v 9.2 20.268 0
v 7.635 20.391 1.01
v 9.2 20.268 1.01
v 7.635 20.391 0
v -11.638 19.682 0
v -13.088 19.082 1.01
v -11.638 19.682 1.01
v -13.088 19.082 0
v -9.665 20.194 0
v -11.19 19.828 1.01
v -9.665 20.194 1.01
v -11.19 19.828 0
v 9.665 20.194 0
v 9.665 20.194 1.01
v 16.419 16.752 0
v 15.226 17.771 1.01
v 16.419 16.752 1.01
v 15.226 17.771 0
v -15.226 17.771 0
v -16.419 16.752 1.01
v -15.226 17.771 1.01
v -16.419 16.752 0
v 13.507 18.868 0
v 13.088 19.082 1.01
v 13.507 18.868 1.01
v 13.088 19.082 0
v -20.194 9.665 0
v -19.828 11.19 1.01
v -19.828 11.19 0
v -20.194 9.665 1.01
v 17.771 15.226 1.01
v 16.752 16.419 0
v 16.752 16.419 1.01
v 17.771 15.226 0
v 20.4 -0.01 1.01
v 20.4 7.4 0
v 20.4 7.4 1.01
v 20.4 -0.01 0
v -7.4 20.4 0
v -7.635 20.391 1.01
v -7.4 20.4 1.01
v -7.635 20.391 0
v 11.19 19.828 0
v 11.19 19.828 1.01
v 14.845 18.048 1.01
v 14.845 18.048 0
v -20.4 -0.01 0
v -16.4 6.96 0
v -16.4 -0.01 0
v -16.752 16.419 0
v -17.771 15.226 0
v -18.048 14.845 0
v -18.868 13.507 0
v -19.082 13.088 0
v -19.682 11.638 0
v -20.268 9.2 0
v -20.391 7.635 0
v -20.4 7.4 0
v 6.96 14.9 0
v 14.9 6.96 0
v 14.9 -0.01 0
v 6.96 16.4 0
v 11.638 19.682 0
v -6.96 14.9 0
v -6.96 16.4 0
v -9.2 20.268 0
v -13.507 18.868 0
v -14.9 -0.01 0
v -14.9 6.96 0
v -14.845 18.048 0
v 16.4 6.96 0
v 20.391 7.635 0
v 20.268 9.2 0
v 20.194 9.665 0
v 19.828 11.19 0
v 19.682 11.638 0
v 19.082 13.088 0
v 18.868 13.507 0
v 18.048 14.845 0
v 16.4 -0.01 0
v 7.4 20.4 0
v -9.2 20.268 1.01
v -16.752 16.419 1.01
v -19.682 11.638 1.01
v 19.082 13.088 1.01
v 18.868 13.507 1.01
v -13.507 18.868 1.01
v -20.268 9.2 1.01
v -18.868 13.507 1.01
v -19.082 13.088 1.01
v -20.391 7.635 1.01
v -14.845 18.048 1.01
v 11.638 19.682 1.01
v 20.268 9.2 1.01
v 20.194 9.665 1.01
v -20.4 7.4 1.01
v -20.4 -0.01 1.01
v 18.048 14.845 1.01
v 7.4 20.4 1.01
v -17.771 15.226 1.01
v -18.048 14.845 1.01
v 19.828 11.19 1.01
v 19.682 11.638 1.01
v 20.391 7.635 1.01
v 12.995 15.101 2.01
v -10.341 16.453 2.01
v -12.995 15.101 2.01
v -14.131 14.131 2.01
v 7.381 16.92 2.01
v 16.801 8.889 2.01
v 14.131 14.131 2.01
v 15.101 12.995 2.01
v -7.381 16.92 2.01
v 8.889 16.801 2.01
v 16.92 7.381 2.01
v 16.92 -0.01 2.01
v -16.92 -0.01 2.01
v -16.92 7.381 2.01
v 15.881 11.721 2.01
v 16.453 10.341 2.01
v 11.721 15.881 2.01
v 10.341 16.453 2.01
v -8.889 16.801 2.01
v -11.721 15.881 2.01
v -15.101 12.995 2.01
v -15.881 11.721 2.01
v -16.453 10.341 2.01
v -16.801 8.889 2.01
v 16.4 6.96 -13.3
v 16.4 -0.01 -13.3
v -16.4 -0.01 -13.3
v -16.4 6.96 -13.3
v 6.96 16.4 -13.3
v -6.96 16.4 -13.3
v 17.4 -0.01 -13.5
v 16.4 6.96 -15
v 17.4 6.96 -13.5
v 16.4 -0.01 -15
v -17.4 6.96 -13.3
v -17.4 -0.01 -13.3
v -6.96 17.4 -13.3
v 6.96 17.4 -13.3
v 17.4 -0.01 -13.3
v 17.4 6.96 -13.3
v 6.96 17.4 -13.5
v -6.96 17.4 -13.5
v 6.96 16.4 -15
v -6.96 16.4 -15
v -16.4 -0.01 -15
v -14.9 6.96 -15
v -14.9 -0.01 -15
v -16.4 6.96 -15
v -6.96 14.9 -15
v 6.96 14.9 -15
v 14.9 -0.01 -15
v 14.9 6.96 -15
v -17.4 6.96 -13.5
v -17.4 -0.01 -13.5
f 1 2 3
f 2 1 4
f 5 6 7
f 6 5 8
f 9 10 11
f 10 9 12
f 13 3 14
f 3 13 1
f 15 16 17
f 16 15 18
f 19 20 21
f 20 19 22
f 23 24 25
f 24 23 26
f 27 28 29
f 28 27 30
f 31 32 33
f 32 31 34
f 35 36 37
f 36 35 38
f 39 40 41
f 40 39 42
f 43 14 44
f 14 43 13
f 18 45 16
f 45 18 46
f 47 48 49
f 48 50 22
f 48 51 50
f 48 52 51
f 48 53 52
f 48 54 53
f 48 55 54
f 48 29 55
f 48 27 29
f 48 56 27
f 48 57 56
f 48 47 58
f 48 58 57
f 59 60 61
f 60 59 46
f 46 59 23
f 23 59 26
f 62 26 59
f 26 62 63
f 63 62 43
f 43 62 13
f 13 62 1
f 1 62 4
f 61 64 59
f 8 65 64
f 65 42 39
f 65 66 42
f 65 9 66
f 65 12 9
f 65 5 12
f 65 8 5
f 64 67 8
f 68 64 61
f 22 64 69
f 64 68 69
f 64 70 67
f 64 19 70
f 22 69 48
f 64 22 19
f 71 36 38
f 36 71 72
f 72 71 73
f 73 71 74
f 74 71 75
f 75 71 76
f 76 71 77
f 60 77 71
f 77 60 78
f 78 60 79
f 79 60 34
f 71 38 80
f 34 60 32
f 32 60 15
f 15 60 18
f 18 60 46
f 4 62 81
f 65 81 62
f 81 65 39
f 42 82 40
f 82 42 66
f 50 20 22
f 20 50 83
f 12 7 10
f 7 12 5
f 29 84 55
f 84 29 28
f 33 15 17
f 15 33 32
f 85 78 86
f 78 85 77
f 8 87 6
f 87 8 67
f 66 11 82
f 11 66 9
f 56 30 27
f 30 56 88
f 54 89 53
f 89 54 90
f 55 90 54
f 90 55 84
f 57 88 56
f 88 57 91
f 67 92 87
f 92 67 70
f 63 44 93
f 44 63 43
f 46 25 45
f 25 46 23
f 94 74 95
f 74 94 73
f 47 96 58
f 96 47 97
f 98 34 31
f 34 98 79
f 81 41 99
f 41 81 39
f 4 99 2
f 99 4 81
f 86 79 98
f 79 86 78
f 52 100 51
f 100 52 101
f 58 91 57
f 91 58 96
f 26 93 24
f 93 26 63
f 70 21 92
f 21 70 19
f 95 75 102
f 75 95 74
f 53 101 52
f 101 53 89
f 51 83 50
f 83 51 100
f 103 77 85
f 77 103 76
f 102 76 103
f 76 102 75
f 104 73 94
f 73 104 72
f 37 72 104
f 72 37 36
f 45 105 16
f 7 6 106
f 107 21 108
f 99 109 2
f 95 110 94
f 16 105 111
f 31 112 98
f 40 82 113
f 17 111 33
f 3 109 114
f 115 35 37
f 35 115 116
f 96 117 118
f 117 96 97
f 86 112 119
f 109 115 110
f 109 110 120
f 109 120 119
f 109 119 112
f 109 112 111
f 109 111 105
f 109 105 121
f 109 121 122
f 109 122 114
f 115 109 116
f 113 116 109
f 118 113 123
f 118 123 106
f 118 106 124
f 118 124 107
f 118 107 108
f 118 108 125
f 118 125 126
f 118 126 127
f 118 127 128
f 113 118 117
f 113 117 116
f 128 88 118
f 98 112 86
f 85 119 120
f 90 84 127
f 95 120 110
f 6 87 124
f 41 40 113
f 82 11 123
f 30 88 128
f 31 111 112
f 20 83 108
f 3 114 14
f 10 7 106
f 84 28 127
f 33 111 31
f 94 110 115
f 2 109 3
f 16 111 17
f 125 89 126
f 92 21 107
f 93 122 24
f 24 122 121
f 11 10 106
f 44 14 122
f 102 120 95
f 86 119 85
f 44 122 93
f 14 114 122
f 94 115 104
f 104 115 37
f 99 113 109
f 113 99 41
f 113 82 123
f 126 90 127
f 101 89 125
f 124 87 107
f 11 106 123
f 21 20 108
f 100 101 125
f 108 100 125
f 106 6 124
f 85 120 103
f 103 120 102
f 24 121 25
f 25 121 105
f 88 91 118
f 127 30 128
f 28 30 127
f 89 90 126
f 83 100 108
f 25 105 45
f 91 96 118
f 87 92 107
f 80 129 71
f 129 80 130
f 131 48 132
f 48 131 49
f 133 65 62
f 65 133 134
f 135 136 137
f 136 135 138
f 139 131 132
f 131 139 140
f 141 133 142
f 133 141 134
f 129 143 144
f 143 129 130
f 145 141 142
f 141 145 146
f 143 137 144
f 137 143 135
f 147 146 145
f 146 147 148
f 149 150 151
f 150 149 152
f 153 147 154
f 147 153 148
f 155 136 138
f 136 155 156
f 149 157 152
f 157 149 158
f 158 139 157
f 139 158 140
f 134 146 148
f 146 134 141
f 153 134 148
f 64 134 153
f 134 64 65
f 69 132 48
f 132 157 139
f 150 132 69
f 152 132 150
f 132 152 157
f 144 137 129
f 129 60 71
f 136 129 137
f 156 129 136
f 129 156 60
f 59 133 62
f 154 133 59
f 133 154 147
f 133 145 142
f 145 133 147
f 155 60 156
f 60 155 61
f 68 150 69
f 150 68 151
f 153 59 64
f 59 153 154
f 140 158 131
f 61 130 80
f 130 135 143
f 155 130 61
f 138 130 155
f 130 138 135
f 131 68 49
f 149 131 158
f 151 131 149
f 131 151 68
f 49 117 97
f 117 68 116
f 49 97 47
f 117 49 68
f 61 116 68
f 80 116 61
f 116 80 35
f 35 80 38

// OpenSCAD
/*----------------------------------------------------------------------------*/
/* Cap Generator
/* by Ziv Botzer
/*----------------------------------------------------------------------------*/

// Turn on for validation during preview, TURN OFF FOR PRODUCTION
show_slice = "On"; // [On, Off]

// Hole shape
hole_shape = "Square"; // [Round, Square, Rectangle]

// HOLE Dimension 1 (if circular = diameter)
hole_dimension1 = 34.8; // [6:0.1:150]

// HOLE Dimension 2 (only for rectangle shape)
hole_dimension2 = 50; // [10:0.1:150]

// HOLE Corner Radius (for square/rectangle shapes)
hole_radius = 10; // [0:0.1:20]

// HOLE Depth (e.g. for a table, thickness of the board)
hole_depth = 20; // [2:0.1:100]


// PLUG: plug length
plug_length = 15; // [2:0.1:100]

// PLUG: plug clearance inside hole
plug_clearance = 1; // [0:0.1:5]

// PLUG: plug material thickness
plug_thickness = 1.5; // [0.5:0.1:5]

// PLUG: Choose if you like snaps or fins
features = "Snaps"; // [Snaps, Fins, None]

// PLUG: Snaps/Fins protrusion of teeth (mm)
feature_length = 1.0; // [0.1:0.1:6]

// PLUG: Snaps/Fins height of teeth (mm)
feature_height = 1.5; // [0.1:0.1:6]

// PLUG FINS: Number of fins
fin_number = 3; // [1:1:6]

// PLUG SNAPS: Determines gaps size between snaps
snap_width_factor = 0.5; // [0.1:0.1:1]


// COVER: thickness (mm)
cover_thickness = 2; // [0.5:0.1:15]

// COVER: Overlap around hole
cover_offset = 3; // [0:0.1:30]

// COVER: Edge design
cover_edge = "Chamfer"; // [Chamfer, Round]

// COVER: Edge design ratio 1 (relative size of chamfer/fillet)
cover_edge_ratioV = 0.5; // [0:0.1:1]

// COVER: Edge design ratio 2 (relative size of chamfer/fillet)
cover_edge_ratioH = 0.1; // [0:0.1:1]

// QUALITY: number of polygon facets
$fn = 40;

// QUALITY: steps in fillet cover design 
fillet_steps = 6; // [4:1:15]


/* [Hidden] */
clearance = 0.01;
show_slice_ = (show_slice=="On");
snaps = features == "Snaps";
fins = features == "Fins";

/* testing area
hole_shape = "Rectangle"; // [Round, Square, Rectangle]
snap_width_factor = .5; // [0.1:0.1:1]
show_slice = "Off"; // [On, Off]
features = "Fins"; // [Snaps, Fins, None]
fin_number = 3; // [1:1:6]
hole_radius = 1; // [0:0.1:20]
*/

/*****************************************/
// Show hole

larger_dim = ((hole_shape=="Rectangle")?max(hole_dimension1, hole_dimension2) : hole_dimension1) + cover_offset;
smaller_dim = (hole_shape=="Rectangle")?min(hole_dimension1, hole_dimension2) : hole_dimension1;
largest_depth = max(hole_depth, plug_length)+cover_thickness+1;

// can't have corner radius exceed half the facet length
hole_radius_safe = (hole_radius > smaller_dim/2) ? (smaller_dim/2 - clearance) : hole_radius;

// Illustrate the piece needing a cover
if (show_slice_)
%difference() {
    translate([0,0,-hole_depth/2])
    cube([larger_dim*1.5,larger_dim*1.5,hole_depth],center=true);
    
    translate([0,0,-(hole_depth+clearance)])
    linear_extrude(hole_depth+4*clearance)
    gen_hole_shape(hole_dimension1, hole_dimension2, hole_radius_safe);

    if (show_slice_)
        translate([0,-larger_dim/2, -(largest_depth/2-clearance)])
        cube([larger_dim*2.2, larger_dim*1, largest_depth+clearance*4], center=true);
}

// Generate the cap
difference() {
    generate_cap();
    
    color("Red")
    if (show_slice_)
        translate([0,-larger_dim/2-0.01, -(largest_depth/2)])
        cube([larger_dim*1.8, larger_dim*1, largest_depth*2], center=true);
}




//********************** FUNCTIONS *****************************

module generate_cap () {
    
    union() {
        // Generate cover with corner design
        if (cover_edge == "Chamfer") {
            linear_extrude((1-cover_edge_ratioV)*cover_thickness + clearance, convexity = 4)
            offset(r=cover_offset)
                gen_hole_shape(hole_dimension1, hole_dimension2, hole_radius_safe);
            
            hull() {
                translate([0,0,(1-cover_edge_ratioV)*cover_thickness])
                for (i = [0,1]) {
                    translate([0,0,i*cover_edge_ratioV*cover_thickness])
                    linear_extrude(0.01)
                    offset(r=cover_offset-i*cover_edge_ratioH*smaller_dim)
                    gen_hole_shape(hole_dimension1, hole_dimension2, hole_radius_safe);
                }
            }
            
         
        }
        else if (cover_edge == "Round") {
            linear_extrude((1-cover_edge_ratioV)*cover_thickness + clearance, convexity = 4)
            offset(r=cover_offset)
                gen_hole_shape(hole_dimension1, hole_dimension2, hole_radius_safe);
            
            hull() {
                translate([0,0,(1-cover_edge_ratioV)*cover_thickness])
                for (i = [0:1/fillet_steps:1]) {
                    translate([0,0, sin(i*90)*cover_edge_ratioV*cover_thickness])
                    linear_extrude(0.01)
                    offset(r=cover_offset - (1-cos(i*90))*cover_edge_ratioH*smaller_dim)
                    gen_hole_shape(hole_dimension1, hole_dimension2, hole_radius_safe);
                }
            }
        }
        
        // Generate plug
        difference() {
            
            union() {
                translate([0,0,-(plug_length) + clearance])
                linear_extrude(plug_length+clearance, convexity = 4)
                offset(r=-plug_clearance)
                gen_hole_shape(hole_dimension1, hole_dimension2, hole_radius_safe);

                
                // Generate plug fins
                //translate([0,0,-(hole_depth) + clearance])
                if (fins) {
                    d = plug_length/(fin_number+1);
                    for (i = [1:fin_number]) {
                        translate([0,0,-(d*i + 0.3*d)])
                        hull() {
                            linear_extrude(0.01)
                            offset(r=-plug_clearance)
                            gen_hole_shape(hole_dimension1, hole_dimension2, hole_radius_safe);
                            
                            translate([0,0,feature_height])
                            linear_extrude(0.2)
                            offset(r=feature_length-plug_clearance)
                            gen_hole_shape(hole_dimension1, hole_dimension2, hole_radius_safe);
                        }
                    }
                }
                
                if (snaps) {
                    translate([0,0,-plug_length])
                    hull() {
                        linear_extrude(0.01)
                        offset(r=-plug_clearance)
                        gen_hole_shape(hole_dimension1, hole_dimension2, hole_radius_safe);
                        
                        translate([0,0,feature_height])
                        linear_extrude(0.2)
                        offset(r=feature_length-plug_clearance)
                        gen_hole_shape(hole_dimension1, hole_dimension2, hole_radius_safe);
                    }

                }
            }
            
            // remove inner volume of plug
            translate([0,0,-(plug_length) - clearance])
            linear_extrude(plug_length+2*clearance, convexity = 4)
            offset(r=-(plug_clearance+plug_thickness))
            gen_hole_shape(hole_dimension1, hole_dimension2, hole_radius_safe);
            
            // remove edge chamfer
            if (!snaps)
            translate([0,0,-(plug_length) ])
            difference() {
                linear_extrude(plug_thickness/2 + clearance )
                offset(r=-plug_clearance  + clearance)
                gen_hole_shape(hole_dimension1, hole_dimension2, hole_radius_safe);
            
                hull() {
                    linear_extrude(0.01)
                    offset(r=-plug_clearance -(plug_thickness/2)  + 2*clearance)
                    gen_hole_shape(hole_dimension1, hole_dimension2, hole_radius_safe);
                    
                    translate([0,0,plug_thickness/2 + 2*clearance ])
                    linear_extrude(0.01)
                    offset(r=-plug_clearance)
                    gen_hole_shape(hole_dimension1, hole_dimension2, hole_radius_safe);
                }
            }
            
            // remove snap gaps
            if (snaps) {
                if (hole_shape == "Square") {
                    factor = 0.5+snap_width_factor*0.4;
                    rotate([0,0,45])
                    for (i = [1:4]) {
                        rotate([0,0,i*360/4])
                        translate([factor*hole_dimension1/sin(45),0,-(plug_length/2 + clearance)])
                        rotate([0,0,45])
                        cube([hole_dimension1,hole_dimension1,plug_length+4*clearance], center=true);
                    }
                    
                } 
                else if (hole_shape == "Round") {
                    factor = 0.48+snap_width_factor*0.3;
                    rotate([0,0,45])
                    for (i = [1:4]) {
                        rotate([0,0,i*360/4])
                        translate([factor*hole_dimension1/sin(45),0,-(plug_length/2 + clearance)])
                        rotate([0,0,45])
                        cube([hole_dimension1,hole_dimension1,plug_length+4*clearance], center=true);
                    }
                }
                else { // Rectangle
                    factor = 0.5+0.4*snap_width_factor;
                    
                    translate([-factor*hole_dimension1,factor*hole_dimension2,-(plug_length/2 + clearance)])
                    cube([hole_dimension1,hole_dimension2,plug_length+4*clearance], center=true);
                    
                    translate([factor*hole_dimension1,factor*hole_dimension2,-(plug_length/2 + clearance)])
                    cube([hole_dimension1,hole_dimension2,plug_length+4*clearance], center=true);
                    
                    translate([-factor*hole_dimension1,-factor*hole_dimension2,-(plug_length/2 + clearance)])
                    cube([hole_dimension1,hole_dimension2,plug_length+4*clearance], center=true);
                    
                    translate([factor*hole_dimension1,-factor*hole_dimension2,-(plug_length/2 + clearance)])
                    cube([hole_dimension1,hole_dimension2,plug_length+4*clearance], center=true);
                    
                }
                
            }
            
        }
    }
}

module gen_hole_shape ( d1, d2, r1 ) {
    if (hole_shape == "Round") {
        circle(d=d1);
    }
    else {
        d1b = d1 - 2*r1;
        d2b = ((hole_shape == "Square")?d1:d2) - 2*r1;
        
        translate([-d1b/2,-d2b/2,0]) {
            if (r1 > 0)
                minkowski() {
                    circle(r1);
                    square([d1b,d2b]);
                }
            else {
                square([d1b,d2b]);
            }
        }
    }
}
